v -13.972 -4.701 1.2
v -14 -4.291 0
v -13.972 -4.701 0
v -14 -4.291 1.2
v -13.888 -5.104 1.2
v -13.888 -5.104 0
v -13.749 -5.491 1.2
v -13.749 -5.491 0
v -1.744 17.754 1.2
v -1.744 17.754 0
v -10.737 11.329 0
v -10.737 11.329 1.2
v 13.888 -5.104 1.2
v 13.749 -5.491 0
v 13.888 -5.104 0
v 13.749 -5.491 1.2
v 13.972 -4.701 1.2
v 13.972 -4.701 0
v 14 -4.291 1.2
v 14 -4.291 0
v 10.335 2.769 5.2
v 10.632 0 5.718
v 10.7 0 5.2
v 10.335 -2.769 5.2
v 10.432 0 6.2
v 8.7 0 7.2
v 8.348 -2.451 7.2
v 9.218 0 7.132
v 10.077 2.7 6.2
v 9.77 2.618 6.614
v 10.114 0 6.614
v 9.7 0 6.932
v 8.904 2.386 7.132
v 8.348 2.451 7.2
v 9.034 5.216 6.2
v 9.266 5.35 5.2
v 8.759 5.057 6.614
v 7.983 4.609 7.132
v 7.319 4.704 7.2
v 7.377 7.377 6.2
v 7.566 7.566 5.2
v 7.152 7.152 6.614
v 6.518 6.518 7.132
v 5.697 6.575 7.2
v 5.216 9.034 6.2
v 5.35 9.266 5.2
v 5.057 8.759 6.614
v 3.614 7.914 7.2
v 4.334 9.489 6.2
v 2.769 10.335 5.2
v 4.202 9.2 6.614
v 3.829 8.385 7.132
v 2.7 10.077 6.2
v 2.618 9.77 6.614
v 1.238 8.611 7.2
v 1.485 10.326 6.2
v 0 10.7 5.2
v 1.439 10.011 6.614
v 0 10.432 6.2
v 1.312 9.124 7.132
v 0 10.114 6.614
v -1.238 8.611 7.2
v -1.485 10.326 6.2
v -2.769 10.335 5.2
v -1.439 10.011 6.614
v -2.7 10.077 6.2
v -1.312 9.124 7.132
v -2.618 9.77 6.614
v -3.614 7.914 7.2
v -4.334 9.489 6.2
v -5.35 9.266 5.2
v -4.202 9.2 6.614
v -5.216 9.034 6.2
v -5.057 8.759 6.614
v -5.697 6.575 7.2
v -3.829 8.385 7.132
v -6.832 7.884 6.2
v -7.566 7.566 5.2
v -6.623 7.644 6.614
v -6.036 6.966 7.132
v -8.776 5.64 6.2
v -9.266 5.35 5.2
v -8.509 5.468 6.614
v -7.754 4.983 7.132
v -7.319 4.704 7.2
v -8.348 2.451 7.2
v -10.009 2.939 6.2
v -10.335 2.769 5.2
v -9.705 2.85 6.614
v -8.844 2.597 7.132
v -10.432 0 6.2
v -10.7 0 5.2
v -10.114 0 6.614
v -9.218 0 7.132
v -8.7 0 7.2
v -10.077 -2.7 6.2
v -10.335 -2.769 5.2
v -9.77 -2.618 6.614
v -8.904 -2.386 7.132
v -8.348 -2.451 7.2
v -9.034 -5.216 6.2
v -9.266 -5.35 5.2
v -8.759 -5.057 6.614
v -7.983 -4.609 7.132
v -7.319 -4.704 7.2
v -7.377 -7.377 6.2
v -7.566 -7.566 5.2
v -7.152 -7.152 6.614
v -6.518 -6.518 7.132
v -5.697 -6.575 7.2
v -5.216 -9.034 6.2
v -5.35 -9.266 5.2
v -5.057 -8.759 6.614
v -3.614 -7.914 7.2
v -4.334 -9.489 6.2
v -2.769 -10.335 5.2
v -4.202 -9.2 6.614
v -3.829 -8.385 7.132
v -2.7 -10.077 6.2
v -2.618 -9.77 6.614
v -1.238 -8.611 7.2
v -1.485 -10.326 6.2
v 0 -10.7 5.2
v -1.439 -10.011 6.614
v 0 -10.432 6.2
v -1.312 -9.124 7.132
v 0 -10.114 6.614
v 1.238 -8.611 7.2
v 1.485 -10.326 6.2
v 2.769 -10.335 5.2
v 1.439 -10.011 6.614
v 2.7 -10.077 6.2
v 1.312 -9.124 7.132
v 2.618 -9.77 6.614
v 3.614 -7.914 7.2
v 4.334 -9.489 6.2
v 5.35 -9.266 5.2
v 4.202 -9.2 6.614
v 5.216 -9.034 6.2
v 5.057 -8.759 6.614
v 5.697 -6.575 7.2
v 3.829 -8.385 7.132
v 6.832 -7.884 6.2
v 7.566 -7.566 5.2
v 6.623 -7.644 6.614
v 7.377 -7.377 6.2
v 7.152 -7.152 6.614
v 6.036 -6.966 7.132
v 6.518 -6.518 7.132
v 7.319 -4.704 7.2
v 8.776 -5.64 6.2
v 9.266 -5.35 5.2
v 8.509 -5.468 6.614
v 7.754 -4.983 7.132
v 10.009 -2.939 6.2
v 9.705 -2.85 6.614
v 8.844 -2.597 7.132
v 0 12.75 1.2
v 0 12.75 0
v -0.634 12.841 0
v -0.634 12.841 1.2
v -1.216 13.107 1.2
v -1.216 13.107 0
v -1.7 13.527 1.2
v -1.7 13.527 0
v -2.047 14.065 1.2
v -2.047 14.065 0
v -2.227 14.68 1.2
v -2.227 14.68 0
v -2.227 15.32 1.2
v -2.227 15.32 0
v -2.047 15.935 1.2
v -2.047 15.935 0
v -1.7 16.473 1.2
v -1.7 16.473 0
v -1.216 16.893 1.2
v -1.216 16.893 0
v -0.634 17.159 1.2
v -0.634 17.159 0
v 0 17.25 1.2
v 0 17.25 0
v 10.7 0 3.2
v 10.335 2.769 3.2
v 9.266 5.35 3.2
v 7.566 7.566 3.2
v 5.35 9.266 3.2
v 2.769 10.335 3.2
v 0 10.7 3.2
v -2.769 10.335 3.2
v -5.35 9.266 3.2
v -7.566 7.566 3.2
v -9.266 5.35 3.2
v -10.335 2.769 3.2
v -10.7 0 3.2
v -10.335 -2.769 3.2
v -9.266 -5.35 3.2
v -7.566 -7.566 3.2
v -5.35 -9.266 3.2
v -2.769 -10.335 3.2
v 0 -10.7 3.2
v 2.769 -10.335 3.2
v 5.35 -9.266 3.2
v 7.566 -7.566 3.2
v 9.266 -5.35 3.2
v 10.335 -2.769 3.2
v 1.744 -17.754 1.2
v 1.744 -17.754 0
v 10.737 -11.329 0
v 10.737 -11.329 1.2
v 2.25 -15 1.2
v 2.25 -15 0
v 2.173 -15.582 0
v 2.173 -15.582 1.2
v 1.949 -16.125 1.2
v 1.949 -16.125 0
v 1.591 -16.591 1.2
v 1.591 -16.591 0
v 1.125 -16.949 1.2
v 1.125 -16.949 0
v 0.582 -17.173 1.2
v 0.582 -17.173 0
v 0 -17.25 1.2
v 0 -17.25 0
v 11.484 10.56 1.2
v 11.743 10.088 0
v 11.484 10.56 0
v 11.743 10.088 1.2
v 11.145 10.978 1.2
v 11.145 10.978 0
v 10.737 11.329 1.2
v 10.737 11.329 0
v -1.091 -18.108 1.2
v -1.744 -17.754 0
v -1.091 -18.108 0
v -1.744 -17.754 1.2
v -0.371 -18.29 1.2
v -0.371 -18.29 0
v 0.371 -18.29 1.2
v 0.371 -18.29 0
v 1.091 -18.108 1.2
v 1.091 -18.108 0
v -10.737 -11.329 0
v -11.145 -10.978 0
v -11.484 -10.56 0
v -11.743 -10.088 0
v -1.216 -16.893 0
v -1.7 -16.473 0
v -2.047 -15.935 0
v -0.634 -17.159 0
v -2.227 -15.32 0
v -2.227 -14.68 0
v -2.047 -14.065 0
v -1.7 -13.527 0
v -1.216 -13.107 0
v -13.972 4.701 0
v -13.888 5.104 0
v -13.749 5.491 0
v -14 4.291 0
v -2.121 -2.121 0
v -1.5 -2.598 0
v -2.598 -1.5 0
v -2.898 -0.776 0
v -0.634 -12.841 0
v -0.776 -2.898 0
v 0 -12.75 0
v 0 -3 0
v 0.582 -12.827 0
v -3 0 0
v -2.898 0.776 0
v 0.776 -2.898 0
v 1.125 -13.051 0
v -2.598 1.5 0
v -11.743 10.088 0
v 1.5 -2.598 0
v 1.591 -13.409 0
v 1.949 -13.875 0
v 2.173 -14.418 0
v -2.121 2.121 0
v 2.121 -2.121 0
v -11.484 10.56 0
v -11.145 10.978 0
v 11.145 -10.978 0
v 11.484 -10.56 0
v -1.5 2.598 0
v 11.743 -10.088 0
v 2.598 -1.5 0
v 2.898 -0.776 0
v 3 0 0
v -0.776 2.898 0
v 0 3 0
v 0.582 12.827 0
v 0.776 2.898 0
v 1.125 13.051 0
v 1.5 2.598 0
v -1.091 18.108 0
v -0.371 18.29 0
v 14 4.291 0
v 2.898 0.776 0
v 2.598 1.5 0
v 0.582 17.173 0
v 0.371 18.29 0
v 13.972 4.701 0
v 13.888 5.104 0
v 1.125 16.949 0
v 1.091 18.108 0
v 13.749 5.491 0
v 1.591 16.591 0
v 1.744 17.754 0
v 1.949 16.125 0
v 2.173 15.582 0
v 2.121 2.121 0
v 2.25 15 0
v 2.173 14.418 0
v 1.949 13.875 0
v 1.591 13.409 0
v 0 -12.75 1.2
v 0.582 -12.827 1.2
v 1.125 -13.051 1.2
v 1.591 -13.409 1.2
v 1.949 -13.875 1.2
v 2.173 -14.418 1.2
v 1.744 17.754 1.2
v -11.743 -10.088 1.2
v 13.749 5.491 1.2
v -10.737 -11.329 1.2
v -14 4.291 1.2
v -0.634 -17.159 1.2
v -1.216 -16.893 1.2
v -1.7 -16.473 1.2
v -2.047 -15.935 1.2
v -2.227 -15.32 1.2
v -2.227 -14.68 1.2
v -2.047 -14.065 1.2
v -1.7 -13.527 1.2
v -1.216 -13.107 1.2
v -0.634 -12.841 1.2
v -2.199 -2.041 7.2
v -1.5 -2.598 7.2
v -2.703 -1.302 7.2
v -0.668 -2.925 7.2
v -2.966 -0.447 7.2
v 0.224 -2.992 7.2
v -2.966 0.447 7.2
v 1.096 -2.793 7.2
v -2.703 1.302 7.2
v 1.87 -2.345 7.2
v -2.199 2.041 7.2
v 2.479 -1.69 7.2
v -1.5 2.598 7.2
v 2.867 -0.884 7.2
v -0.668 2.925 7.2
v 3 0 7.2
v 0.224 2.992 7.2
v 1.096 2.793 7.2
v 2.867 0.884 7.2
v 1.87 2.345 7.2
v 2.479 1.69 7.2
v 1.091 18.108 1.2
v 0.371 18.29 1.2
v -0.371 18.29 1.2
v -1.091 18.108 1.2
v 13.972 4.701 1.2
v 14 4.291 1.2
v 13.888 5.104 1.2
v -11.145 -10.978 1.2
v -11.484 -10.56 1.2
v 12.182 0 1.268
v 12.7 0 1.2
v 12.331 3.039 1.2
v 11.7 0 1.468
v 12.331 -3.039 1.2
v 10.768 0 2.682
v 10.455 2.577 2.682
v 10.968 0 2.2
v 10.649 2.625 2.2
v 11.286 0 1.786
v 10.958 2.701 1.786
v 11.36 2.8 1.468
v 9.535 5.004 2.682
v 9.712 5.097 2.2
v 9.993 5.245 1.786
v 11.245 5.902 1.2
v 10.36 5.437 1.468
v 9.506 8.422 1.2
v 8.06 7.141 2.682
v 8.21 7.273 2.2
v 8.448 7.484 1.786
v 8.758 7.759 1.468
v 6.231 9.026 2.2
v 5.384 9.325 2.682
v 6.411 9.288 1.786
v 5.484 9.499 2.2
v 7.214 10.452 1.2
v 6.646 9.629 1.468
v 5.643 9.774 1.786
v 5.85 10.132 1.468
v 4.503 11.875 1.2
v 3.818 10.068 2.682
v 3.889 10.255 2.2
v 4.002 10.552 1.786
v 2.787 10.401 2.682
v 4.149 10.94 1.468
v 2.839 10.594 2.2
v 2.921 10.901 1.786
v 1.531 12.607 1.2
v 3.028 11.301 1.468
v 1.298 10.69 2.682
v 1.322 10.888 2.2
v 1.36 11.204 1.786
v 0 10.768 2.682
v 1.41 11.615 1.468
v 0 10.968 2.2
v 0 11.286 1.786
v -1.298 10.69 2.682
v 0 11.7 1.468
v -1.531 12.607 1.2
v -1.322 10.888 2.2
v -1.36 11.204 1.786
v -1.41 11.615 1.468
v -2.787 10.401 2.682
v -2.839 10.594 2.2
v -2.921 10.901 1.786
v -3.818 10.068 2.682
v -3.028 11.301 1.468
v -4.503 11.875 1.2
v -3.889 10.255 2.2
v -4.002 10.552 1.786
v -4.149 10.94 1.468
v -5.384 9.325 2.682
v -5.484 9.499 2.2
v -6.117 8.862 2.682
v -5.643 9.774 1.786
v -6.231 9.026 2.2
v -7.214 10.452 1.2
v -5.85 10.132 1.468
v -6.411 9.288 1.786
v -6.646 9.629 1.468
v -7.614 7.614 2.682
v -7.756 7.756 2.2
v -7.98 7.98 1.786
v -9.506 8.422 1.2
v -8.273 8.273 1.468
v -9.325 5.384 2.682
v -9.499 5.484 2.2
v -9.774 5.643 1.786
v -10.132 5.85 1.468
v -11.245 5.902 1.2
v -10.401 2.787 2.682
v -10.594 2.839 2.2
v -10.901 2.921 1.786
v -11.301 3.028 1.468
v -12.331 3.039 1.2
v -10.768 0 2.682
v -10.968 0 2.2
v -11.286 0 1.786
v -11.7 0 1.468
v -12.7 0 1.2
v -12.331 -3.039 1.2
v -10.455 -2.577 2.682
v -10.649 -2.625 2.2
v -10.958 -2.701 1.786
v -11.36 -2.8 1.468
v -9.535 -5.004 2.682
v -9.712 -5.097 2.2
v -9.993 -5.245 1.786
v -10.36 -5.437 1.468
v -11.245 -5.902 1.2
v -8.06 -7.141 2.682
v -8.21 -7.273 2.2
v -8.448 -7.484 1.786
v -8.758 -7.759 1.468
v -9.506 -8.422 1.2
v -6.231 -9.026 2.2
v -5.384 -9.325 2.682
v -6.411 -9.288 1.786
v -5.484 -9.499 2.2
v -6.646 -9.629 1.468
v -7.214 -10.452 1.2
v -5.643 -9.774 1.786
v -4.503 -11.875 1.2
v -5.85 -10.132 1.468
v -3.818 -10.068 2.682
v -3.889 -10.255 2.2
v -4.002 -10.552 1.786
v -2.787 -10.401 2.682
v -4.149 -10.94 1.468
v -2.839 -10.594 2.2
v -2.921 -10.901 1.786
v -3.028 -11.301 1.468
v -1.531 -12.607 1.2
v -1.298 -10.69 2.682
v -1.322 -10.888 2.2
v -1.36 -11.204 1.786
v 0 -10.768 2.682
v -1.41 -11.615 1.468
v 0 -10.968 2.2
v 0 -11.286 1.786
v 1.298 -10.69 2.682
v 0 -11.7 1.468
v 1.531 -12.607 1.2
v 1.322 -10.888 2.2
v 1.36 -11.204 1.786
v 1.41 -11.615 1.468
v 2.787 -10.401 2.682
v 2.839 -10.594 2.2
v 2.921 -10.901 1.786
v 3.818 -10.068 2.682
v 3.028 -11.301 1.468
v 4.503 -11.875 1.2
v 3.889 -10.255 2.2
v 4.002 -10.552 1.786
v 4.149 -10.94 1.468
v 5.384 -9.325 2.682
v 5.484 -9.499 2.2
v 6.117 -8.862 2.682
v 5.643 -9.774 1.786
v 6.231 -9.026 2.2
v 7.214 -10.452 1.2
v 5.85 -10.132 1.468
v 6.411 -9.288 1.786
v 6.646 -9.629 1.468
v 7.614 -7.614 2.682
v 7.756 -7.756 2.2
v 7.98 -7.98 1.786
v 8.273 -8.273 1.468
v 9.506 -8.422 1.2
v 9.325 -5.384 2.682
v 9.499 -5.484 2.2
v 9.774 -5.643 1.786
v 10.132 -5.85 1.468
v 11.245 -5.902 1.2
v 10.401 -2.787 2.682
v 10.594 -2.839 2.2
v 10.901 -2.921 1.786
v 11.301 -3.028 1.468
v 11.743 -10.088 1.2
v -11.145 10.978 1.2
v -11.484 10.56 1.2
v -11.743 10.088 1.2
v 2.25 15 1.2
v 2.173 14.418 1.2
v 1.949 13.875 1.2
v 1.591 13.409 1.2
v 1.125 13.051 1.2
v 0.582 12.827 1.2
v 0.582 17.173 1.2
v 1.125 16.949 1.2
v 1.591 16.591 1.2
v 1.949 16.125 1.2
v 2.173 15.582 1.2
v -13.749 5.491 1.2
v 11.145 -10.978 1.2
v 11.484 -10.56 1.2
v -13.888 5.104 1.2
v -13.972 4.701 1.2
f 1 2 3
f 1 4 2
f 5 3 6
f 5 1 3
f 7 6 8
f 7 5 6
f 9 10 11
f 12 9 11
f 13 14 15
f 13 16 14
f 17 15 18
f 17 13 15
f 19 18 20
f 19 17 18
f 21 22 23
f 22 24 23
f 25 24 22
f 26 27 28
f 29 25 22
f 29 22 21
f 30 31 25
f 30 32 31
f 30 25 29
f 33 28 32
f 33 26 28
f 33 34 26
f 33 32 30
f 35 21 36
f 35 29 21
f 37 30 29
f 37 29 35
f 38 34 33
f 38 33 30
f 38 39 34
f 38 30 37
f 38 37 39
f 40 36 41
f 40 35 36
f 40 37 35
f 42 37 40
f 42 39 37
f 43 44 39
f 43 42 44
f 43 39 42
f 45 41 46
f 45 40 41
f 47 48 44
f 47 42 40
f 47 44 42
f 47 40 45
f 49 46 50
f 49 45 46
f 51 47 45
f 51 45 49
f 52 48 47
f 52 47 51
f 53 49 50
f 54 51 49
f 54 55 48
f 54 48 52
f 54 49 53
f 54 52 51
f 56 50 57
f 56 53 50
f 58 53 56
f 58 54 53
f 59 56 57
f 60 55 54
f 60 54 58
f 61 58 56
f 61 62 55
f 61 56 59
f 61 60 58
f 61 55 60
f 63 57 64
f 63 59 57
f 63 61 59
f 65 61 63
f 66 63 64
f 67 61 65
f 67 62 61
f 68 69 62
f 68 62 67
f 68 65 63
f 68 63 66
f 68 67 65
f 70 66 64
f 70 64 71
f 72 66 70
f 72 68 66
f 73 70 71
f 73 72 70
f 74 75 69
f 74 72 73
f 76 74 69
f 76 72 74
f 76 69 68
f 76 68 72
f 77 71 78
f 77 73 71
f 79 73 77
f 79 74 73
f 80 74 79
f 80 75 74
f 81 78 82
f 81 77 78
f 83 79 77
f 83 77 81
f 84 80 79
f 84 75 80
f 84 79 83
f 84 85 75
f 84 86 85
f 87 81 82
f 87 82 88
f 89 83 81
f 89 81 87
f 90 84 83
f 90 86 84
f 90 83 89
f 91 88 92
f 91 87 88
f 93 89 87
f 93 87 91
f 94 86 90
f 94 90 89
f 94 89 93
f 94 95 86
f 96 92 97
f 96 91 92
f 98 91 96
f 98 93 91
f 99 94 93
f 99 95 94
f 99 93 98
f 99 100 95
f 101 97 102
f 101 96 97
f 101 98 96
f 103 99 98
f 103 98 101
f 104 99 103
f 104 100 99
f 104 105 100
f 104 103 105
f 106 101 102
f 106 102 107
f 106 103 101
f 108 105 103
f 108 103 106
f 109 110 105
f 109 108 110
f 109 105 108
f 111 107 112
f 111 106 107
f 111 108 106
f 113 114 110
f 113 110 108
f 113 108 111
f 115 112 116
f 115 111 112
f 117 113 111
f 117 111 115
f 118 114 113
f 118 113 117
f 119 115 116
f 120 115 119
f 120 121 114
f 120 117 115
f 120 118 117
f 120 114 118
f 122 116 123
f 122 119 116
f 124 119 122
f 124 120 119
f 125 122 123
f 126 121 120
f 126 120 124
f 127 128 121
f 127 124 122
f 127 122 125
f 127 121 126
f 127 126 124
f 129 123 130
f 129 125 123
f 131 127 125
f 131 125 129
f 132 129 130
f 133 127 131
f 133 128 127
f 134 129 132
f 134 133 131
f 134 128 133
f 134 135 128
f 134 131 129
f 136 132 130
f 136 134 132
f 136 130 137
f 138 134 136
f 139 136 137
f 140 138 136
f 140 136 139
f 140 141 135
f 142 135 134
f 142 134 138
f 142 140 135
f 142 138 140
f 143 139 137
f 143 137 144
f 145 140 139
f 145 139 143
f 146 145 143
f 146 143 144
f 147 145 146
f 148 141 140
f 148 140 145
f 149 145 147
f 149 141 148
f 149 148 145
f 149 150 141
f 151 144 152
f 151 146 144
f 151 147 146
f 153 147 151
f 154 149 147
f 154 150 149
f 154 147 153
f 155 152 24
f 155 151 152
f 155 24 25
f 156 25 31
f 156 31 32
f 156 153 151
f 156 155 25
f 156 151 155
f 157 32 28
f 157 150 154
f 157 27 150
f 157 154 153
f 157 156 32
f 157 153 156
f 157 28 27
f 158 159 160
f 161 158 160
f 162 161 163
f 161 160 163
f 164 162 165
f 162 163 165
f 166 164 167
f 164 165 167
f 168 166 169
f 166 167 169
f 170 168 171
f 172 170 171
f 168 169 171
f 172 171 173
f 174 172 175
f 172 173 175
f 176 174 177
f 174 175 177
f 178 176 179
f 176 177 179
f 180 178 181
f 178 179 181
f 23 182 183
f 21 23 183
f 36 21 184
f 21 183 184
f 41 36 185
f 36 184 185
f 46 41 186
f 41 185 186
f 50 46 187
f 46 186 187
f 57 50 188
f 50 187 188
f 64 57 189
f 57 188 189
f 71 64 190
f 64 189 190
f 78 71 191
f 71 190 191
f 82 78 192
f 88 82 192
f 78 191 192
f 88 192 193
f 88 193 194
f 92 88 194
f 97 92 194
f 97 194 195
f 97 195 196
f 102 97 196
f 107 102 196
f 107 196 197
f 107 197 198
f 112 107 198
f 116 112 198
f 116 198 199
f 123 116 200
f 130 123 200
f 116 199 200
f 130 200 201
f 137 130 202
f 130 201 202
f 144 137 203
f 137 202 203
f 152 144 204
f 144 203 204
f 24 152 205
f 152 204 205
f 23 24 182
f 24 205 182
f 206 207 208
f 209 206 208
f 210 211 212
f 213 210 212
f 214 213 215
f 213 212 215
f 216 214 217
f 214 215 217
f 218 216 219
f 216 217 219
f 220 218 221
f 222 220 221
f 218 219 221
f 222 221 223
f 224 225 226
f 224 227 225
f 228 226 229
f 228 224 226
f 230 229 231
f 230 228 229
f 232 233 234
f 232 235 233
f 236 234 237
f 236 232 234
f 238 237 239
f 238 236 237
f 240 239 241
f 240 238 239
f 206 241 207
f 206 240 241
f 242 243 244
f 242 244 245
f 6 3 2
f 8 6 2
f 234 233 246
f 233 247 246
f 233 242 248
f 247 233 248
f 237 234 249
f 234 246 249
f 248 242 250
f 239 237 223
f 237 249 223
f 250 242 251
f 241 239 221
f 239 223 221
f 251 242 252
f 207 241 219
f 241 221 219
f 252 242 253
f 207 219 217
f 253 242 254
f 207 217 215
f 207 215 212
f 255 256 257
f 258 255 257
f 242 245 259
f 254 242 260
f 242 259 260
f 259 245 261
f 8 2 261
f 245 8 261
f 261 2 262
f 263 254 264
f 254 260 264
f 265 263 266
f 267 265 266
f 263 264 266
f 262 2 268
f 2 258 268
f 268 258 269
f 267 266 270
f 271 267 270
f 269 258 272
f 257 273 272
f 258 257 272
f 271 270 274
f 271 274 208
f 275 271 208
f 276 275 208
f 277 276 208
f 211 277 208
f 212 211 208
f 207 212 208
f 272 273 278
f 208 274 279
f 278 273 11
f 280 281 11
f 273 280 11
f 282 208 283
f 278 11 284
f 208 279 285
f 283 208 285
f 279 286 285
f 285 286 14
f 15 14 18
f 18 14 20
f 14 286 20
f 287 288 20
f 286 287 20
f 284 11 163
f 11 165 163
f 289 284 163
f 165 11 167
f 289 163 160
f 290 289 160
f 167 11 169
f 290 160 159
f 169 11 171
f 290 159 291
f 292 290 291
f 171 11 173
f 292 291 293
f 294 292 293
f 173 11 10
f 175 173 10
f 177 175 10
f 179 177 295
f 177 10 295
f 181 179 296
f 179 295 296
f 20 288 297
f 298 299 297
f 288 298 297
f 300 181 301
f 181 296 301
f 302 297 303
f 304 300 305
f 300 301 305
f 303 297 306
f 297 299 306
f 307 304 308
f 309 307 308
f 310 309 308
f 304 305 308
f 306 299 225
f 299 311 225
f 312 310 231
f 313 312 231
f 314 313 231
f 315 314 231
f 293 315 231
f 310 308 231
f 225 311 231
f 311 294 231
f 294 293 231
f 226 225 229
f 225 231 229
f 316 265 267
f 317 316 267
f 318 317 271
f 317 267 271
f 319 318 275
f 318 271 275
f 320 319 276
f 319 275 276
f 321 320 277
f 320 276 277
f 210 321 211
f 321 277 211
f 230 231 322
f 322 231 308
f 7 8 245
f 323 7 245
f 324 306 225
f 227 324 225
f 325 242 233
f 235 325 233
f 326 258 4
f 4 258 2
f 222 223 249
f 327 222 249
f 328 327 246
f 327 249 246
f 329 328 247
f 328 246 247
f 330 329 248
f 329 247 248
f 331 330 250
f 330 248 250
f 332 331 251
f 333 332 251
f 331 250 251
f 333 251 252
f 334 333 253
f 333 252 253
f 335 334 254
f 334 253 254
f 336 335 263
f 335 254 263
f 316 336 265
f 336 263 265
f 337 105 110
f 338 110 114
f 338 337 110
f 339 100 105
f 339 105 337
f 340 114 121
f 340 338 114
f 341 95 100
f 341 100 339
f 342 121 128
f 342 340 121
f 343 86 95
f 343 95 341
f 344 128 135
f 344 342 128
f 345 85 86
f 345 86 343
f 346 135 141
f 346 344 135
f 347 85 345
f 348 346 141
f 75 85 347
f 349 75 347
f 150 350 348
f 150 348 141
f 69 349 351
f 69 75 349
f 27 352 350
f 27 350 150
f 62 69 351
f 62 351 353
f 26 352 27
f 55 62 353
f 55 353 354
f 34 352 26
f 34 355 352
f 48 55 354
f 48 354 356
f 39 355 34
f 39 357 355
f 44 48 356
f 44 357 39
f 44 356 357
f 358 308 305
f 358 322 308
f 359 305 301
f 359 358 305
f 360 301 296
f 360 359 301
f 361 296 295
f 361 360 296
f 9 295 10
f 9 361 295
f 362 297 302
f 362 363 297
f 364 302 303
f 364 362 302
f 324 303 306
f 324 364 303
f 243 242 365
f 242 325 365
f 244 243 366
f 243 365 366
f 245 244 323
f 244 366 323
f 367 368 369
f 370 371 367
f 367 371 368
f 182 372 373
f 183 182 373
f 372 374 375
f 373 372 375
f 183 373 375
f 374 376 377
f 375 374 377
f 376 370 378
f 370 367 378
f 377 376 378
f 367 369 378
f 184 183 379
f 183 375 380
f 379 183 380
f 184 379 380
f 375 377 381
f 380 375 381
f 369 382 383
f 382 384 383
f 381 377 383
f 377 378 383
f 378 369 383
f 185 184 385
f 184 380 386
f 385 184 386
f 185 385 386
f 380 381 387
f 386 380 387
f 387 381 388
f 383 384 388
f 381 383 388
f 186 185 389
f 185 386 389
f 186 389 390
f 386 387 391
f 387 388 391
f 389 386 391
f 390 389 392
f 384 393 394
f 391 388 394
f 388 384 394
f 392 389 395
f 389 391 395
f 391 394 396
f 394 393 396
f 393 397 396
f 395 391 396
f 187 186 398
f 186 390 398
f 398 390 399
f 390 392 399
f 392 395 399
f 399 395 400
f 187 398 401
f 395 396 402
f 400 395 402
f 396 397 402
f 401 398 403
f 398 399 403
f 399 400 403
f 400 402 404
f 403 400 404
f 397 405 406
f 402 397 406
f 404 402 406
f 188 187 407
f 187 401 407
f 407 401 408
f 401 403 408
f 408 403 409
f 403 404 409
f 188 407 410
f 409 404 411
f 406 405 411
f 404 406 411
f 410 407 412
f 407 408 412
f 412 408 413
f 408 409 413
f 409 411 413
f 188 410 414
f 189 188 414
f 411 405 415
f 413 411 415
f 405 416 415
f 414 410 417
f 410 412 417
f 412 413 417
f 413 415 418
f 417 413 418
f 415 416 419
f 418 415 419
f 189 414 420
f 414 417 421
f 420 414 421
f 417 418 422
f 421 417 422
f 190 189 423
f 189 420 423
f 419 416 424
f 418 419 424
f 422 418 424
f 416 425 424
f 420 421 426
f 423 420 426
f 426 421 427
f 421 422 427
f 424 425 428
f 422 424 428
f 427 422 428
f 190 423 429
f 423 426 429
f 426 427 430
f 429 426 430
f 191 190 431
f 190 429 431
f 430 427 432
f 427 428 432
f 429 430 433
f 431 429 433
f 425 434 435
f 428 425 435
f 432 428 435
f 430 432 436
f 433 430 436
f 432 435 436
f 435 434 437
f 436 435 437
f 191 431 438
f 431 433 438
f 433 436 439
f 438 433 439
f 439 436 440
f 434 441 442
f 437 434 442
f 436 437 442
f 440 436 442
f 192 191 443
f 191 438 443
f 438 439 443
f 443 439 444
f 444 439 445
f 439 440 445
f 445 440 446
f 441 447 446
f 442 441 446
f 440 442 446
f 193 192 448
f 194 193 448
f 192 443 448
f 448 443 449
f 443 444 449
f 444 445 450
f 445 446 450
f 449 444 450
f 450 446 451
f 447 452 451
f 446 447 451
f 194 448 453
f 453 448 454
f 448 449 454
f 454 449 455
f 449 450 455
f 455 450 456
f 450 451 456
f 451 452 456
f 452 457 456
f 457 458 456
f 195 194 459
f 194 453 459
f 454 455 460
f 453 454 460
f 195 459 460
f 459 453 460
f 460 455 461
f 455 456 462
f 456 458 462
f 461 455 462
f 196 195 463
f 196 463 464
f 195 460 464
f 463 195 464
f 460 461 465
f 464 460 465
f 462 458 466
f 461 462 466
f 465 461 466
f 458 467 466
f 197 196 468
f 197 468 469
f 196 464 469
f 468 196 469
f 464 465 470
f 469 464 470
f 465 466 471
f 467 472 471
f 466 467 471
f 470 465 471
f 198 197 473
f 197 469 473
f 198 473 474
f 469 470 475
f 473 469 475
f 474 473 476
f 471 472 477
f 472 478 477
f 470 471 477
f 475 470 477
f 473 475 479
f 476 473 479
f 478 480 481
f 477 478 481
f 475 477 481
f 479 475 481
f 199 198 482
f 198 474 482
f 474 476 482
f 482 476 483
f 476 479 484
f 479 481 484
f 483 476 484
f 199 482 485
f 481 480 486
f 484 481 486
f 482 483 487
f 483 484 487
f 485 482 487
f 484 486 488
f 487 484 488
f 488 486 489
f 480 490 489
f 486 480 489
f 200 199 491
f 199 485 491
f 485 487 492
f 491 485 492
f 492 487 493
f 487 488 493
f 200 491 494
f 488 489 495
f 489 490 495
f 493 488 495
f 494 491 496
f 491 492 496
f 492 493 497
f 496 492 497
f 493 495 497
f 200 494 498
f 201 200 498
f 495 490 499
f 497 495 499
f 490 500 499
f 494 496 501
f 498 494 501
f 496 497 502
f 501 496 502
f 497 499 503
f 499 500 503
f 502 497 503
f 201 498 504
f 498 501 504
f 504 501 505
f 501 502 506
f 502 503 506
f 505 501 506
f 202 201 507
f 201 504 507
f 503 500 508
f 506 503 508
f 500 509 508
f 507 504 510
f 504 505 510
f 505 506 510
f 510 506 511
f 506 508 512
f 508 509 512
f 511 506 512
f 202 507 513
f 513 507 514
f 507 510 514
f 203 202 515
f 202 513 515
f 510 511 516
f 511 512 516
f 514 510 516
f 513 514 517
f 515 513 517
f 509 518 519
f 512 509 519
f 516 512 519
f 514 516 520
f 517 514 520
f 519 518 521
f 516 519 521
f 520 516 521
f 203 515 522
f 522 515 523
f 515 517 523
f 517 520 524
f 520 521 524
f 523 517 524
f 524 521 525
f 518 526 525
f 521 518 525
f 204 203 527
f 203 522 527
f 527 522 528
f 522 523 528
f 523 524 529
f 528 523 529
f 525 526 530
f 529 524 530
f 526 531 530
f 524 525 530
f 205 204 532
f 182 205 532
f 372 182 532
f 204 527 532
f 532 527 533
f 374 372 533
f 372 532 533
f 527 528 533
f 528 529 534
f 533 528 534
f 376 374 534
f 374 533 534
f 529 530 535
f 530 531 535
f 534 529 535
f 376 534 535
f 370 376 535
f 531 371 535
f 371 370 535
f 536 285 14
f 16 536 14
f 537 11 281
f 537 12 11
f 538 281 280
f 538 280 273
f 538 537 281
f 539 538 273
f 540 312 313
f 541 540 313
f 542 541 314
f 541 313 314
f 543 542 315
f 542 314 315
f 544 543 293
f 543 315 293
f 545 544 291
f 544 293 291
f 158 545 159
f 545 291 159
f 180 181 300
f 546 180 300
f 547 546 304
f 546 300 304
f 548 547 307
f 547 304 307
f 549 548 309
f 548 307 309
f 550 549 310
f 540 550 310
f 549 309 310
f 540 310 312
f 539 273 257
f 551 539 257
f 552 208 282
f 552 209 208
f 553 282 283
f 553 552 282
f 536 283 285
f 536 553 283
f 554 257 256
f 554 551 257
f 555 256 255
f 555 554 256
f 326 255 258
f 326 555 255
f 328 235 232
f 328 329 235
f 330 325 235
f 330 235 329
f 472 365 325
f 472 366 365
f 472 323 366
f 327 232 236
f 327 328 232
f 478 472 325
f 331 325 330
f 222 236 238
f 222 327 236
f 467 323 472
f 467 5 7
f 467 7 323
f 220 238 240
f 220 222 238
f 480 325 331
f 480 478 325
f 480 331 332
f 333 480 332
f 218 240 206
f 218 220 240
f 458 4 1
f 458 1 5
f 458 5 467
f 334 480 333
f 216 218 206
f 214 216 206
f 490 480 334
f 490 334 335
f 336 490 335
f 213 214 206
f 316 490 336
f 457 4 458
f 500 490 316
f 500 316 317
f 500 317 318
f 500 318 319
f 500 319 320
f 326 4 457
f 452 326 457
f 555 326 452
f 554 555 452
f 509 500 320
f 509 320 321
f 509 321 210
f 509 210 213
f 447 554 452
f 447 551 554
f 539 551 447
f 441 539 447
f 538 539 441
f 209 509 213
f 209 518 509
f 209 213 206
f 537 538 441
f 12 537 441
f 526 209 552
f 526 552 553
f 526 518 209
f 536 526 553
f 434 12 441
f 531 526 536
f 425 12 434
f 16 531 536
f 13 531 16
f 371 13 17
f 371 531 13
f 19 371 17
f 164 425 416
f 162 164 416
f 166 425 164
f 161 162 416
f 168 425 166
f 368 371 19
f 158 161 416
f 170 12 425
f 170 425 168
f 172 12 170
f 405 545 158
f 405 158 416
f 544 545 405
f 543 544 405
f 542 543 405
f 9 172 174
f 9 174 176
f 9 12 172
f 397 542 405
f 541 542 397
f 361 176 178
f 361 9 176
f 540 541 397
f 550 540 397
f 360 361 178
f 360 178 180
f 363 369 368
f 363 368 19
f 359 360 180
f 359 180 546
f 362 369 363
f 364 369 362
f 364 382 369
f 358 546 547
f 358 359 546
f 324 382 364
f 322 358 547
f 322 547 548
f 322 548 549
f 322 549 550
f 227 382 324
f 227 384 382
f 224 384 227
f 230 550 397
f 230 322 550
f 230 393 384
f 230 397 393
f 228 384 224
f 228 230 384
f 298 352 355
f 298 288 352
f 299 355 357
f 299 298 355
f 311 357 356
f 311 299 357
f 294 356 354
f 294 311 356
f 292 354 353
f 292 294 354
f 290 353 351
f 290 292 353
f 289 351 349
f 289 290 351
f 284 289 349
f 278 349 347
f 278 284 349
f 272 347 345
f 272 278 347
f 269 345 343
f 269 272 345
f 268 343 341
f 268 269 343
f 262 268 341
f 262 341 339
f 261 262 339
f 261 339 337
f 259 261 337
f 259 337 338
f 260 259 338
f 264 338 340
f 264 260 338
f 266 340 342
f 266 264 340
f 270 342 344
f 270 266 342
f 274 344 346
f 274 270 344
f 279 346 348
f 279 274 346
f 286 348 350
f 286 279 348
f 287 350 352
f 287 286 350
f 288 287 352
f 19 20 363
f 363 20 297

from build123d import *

# Parameters (mm, degrees)
SKETCH_1_R          = 2.25
SKETCH_1_R_2        = 3
EXTRUDE_1_DEPTH     = 1.2
FILLET_1_R          = 3
SKETCH_2_R          = 10.7
EXTRUDE_2_DEPTH     = 6
SKETCH_1_3_R        = 3
CUT_EXTRUDE_1_DEPTH = 20
FILLET_2_R          = 2


with BuildPart() as part:
    # ｽｹｯﾁ1 → ﾎﾞｽ - 押し出し1 (new body)
    with BuildSketch(Plane.XY):
        Polygon((-11.411313878, -10.847751594), (0, -19), (11.411313878, -10.847751594), (14, -4.917243675), (14, 4.917243675), (11.411313878, 10.847751594), (0, 19), (-11.411313878, 10.847751594), (-14, 4.917243675), (-14, -4.917243675), align=None)
        with Locations((0, 15)):
            Circle(SKETCH_1_R, mode=Mode.SUBTRACT)
        Circle(SKETCH_1_R_2, mode=Mode.SUBTRACT)
        with Locations((0, -15)):
            Circle(SKETCH_1_R, mode=Mode.SUBTRACT)
    extrude(amount=EXTRUDE_1_DEPTH)

    # ﾌｨﾚｯﾄ1
    fillet_1_edges = [part.edges().sort_by_distance(p)[0] for p in [
        (-14, -4.917243675, 0.6),
        (-11.411313878, -10.847751594, 0.6),
        (0, -19, 0.6),
        (11.411313878, -10.847751594, 0.6),
        (14, -4.917243675, 0.6),
        (14, 4.917243675, 0.6),
        (11.411313878, 10.847751594, 0.6),
        (-14, 4.917243675, 0.6),
        (-11.411313878, 10.847751594, 0.6),
        (0, 19, 0.6),
    ]]
    fillet(fillet_1_edges, radius=FILLET_1_R)

    # ｽｹｯﾁ2 → ﾎﾞｽ - 押し出し2 (add)
    with BuildSketch(Plane.XY.offset(1.2)):
        Circle(SKETCH_2_R)
    extrude(amount=EXTRUDE_2_DEPTH)

    # ｽｹｯﾁ1<3> → ｶｯﾄ - 押し出し1 (cut)
    with BuildSketch(Plane.XY):
        Circle(SKETCH_1_3_R)
    extrude(amount=CUT_EXTRUDE_1_DEPTH, mode=Mode.SUBTRACT)

    # ﾌｨﾚｯﾄ2
    fillet_2_edges = [part.edges().sort_by_distance(p)[0] for p in [
        (-10.7, 0, 7.2),
        (-10.7, 0, 1.2),
    ]]
    fillet(fillet_2_edges, radius=FILLET_2_R)


solid = part.part
